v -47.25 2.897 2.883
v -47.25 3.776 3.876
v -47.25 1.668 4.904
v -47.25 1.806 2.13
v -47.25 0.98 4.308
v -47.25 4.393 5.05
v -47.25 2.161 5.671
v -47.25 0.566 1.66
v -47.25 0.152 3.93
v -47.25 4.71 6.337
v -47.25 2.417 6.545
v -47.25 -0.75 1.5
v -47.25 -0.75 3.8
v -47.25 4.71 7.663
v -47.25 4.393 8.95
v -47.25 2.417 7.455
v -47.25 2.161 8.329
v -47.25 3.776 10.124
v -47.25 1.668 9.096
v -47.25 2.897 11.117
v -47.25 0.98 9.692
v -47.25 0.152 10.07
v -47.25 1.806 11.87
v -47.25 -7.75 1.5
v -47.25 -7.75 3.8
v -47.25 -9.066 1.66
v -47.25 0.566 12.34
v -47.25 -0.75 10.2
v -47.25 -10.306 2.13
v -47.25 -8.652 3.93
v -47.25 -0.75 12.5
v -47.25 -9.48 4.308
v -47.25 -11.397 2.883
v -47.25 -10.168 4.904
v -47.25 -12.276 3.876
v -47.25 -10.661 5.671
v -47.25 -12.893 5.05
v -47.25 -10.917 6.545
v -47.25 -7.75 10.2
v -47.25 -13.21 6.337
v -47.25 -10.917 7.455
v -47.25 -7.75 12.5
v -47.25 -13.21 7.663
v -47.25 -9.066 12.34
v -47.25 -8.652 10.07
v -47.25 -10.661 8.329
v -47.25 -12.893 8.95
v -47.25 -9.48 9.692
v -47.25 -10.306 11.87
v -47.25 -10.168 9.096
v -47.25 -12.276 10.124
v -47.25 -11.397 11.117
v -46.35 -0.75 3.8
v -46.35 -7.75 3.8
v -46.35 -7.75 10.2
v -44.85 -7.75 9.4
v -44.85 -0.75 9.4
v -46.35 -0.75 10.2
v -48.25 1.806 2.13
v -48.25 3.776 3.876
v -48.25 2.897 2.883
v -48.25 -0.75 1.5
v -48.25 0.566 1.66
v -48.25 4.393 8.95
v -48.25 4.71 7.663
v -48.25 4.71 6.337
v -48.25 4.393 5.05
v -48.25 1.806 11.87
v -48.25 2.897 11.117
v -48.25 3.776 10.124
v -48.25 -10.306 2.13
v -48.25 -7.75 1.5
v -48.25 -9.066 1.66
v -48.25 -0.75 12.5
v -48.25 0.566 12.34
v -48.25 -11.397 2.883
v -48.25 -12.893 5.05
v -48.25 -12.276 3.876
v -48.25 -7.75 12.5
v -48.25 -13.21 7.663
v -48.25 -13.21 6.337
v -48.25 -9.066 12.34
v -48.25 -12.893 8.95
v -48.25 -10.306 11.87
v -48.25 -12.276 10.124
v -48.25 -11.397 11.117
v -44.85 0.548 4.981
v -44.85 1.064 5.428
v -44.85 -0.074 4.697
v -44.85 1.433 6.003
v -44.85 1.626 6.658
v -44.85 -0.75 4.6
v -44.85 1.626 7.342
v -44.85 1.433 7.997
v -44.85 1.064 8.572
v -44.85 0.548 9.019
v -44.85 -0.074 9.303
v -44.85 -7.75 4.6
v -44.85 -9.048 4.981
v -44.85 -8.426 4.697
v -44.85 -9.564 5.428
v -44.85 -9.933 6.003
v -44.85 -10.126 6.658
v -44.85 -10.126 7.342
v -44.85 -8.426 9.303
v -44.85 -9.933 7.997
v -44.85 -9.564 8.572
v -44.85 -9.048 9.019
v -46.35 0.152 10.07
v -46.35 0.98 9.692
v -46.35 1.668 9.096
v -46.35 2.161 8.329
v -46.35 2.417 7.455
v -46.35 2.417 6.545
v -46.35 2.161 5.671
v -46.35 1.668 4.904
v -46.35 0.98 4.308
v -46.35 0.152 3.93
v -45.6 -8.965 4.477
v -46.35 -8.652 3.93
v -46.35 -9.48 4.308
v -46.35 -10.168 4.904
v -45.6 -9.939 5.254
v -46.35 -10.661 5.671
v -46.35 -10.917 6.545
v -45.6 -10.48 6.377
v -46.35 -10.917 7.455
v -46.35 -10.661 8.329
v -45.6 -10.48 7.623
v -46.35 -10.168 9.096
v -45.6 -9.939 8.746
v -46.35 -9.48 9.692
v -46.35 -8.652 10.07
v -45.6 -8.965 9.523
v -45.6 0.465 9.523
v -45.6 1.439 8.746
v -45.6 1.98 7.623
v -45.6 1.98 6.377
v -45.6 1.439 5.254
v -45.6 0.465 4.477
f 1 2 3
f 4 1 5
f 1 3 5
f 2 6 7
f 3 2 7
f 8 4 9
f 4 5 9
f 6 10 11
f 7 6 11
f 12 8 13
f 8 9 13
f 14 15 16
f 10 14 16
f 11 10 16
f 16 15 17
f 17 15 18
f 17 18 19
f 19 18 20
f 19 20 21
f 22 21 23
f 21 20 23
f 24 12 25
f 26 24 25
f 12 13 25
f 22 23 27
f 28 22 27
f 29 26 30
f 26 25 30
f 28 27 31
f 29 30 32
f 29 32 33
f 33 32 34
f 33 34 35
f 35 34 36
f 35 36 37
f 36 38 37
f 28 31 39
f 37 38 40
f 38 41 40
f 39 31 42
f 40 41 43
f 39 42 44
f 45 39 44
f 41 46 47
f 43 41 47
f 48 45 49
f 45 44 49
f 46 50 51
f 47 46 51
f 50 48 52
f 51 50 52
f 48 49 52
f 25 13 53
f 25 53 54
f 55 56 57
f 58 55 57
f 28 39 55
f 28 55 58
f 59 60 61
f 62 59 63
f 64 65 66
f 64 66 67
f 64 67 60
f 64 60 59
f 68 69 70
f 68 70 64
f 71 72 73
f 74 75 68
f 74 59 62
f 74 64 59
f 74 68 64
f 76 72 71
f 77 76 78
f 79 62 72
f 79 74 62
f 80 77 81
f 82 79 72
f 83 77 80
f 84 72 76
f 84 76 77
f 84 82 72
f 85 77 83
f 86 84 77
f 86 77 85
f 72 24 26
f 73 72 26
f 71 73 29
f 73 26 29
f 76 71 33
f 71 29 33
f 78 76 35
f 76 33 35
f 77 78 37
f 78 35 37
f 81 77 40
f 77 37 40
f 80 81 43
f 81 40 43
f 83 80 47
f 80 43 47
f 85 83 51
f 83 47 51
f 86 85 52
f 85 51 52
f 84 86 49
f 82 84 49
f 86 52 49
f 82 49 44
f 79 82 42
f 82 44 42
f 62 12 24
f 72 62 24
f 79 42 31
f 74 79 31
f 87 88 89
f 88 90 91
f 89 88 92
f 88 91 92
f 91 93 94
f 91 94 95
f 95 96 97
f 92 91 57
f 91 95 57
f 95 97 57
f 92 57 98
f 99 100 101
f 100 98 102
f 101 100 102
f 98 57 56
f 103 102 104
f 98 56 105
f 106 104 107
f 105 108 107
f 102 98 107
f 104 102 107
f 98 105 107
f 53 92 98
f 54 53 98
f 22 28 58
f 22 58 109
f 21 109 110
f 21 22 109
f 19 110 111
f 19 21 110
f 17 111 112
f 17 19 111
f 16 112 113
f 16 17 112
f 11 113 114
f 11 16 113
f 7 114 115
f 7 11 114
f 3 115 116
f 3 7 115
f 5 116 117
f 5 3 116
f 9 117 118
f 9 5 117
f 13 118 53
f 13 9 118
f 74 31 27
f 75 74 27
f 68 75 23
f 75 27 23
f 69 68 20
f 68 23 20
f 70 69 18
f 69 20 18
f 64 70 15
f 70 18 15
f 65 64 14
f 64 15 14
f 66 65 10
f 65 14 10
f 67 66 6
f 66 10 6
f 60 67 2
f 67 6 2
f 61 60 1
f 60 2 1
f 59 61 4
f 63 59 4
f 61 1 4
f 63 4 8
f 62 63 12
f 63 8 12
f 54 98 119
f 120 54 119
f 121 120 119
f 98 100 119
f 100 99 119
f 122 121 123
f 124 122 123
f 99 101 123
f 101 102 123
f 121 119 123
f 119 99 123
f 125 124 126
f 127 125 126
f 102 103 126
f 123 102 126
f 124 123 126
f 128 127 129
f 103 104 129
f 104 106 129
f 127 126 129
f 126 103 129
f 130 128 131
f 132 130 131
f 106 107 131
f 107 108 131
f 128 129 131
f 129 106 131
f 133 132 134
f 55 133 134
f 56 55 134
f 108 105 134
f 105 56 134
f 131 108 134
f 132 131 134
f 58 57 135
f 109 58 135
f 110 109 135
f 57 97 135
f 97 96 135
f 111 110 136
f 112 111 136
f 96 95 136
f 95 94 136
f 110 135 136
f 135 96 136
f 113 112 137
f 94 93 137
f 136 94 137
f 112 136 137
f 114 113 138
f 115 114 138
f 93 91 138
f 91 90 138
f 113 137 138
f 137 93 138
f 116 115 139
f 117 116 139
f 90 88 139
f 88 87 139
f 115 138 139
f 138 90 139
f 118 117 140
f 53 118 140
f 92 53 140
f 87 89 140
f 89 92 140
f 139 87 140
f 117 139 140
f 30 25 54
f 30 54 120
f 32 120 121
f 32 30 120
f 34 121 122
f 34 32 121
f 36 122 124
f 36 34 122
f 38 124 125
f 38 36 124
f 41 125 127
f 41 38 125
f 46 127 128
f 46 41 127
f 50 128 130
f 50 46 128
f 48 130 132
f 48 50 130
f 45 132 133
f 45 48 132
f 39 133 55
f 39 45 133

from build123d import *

# Parameters (mm, degrees)
EXTRUDE008_DEPTH = 1
EXTRUDE007_DEPTH = 2.4
CHAMFER004_SIZE2 = 0.8
CHAMFER004_SIZE  = 1.5


with BuildPart() as extrude008:
    # Sketch009 (on Sketch) → Extrude008 (new body)
    with BuildSketch(Plane(origin=(-47.25, 0, 0), x_dir=(0, -1, 0), z_dir=(-1, 0, 0))):
        with BuildLine():
            ThreePointArc((0.75, 12.5), (-4.75, 7), (0.75, 1.5))
            Line((0.75, 1.5), (7.75, 1.5))
            ThreePointArc((7.75, 1.5), (13.25, 7), (7.75, 12.5))
            Line((7.75, 12.5), (0.75, 12.5))
        make_face()
    extrude(amount=EXTRUDE008_DEPTH)


with BuildPart() as deckel_usb:
    # Sketch008 (on Sketch) → Extrude007 (new body)
    with BuildSketch(Plane(origin=(-47.25, 0, 0), x_dir=(0, -1, 0), z_dir=(-1, 0, 0))):
        with BuildLine():
            ThreePointArc((0.75, 10.2), (-2.45, 7), (0.75, 3.8))
            Line((0.75, 3.8), (7.75, 3.8))
            ThreePointArc((7.75, 3.8), (10.95, 7), (7.75, 10.2))
            Line((7.75, 10.2), (0.75, 10.2))
        make_face()
    extrude(amount=-EXTRUDE007_DEPTH)

    # Chamfer004
    chamfer004_edges = [deckel_usb.edges().sort_by_distance(p)[0] for p in [
        (-44.85, -4.25, 3.8),
    ]]
    chamfer004_side = deckel_usb.faces().sort_by_distance((-46.05, -4.25, 3.8))[0]
    chamfer(chamfer004_edges, length=CHAMFER004_SIZE, length2=CHAMFER004_SIZE2, reference=chamfer004_side)

    # Connect001: union Extrude008
    add(extrude008.part)


solid = deckel_usb.part
